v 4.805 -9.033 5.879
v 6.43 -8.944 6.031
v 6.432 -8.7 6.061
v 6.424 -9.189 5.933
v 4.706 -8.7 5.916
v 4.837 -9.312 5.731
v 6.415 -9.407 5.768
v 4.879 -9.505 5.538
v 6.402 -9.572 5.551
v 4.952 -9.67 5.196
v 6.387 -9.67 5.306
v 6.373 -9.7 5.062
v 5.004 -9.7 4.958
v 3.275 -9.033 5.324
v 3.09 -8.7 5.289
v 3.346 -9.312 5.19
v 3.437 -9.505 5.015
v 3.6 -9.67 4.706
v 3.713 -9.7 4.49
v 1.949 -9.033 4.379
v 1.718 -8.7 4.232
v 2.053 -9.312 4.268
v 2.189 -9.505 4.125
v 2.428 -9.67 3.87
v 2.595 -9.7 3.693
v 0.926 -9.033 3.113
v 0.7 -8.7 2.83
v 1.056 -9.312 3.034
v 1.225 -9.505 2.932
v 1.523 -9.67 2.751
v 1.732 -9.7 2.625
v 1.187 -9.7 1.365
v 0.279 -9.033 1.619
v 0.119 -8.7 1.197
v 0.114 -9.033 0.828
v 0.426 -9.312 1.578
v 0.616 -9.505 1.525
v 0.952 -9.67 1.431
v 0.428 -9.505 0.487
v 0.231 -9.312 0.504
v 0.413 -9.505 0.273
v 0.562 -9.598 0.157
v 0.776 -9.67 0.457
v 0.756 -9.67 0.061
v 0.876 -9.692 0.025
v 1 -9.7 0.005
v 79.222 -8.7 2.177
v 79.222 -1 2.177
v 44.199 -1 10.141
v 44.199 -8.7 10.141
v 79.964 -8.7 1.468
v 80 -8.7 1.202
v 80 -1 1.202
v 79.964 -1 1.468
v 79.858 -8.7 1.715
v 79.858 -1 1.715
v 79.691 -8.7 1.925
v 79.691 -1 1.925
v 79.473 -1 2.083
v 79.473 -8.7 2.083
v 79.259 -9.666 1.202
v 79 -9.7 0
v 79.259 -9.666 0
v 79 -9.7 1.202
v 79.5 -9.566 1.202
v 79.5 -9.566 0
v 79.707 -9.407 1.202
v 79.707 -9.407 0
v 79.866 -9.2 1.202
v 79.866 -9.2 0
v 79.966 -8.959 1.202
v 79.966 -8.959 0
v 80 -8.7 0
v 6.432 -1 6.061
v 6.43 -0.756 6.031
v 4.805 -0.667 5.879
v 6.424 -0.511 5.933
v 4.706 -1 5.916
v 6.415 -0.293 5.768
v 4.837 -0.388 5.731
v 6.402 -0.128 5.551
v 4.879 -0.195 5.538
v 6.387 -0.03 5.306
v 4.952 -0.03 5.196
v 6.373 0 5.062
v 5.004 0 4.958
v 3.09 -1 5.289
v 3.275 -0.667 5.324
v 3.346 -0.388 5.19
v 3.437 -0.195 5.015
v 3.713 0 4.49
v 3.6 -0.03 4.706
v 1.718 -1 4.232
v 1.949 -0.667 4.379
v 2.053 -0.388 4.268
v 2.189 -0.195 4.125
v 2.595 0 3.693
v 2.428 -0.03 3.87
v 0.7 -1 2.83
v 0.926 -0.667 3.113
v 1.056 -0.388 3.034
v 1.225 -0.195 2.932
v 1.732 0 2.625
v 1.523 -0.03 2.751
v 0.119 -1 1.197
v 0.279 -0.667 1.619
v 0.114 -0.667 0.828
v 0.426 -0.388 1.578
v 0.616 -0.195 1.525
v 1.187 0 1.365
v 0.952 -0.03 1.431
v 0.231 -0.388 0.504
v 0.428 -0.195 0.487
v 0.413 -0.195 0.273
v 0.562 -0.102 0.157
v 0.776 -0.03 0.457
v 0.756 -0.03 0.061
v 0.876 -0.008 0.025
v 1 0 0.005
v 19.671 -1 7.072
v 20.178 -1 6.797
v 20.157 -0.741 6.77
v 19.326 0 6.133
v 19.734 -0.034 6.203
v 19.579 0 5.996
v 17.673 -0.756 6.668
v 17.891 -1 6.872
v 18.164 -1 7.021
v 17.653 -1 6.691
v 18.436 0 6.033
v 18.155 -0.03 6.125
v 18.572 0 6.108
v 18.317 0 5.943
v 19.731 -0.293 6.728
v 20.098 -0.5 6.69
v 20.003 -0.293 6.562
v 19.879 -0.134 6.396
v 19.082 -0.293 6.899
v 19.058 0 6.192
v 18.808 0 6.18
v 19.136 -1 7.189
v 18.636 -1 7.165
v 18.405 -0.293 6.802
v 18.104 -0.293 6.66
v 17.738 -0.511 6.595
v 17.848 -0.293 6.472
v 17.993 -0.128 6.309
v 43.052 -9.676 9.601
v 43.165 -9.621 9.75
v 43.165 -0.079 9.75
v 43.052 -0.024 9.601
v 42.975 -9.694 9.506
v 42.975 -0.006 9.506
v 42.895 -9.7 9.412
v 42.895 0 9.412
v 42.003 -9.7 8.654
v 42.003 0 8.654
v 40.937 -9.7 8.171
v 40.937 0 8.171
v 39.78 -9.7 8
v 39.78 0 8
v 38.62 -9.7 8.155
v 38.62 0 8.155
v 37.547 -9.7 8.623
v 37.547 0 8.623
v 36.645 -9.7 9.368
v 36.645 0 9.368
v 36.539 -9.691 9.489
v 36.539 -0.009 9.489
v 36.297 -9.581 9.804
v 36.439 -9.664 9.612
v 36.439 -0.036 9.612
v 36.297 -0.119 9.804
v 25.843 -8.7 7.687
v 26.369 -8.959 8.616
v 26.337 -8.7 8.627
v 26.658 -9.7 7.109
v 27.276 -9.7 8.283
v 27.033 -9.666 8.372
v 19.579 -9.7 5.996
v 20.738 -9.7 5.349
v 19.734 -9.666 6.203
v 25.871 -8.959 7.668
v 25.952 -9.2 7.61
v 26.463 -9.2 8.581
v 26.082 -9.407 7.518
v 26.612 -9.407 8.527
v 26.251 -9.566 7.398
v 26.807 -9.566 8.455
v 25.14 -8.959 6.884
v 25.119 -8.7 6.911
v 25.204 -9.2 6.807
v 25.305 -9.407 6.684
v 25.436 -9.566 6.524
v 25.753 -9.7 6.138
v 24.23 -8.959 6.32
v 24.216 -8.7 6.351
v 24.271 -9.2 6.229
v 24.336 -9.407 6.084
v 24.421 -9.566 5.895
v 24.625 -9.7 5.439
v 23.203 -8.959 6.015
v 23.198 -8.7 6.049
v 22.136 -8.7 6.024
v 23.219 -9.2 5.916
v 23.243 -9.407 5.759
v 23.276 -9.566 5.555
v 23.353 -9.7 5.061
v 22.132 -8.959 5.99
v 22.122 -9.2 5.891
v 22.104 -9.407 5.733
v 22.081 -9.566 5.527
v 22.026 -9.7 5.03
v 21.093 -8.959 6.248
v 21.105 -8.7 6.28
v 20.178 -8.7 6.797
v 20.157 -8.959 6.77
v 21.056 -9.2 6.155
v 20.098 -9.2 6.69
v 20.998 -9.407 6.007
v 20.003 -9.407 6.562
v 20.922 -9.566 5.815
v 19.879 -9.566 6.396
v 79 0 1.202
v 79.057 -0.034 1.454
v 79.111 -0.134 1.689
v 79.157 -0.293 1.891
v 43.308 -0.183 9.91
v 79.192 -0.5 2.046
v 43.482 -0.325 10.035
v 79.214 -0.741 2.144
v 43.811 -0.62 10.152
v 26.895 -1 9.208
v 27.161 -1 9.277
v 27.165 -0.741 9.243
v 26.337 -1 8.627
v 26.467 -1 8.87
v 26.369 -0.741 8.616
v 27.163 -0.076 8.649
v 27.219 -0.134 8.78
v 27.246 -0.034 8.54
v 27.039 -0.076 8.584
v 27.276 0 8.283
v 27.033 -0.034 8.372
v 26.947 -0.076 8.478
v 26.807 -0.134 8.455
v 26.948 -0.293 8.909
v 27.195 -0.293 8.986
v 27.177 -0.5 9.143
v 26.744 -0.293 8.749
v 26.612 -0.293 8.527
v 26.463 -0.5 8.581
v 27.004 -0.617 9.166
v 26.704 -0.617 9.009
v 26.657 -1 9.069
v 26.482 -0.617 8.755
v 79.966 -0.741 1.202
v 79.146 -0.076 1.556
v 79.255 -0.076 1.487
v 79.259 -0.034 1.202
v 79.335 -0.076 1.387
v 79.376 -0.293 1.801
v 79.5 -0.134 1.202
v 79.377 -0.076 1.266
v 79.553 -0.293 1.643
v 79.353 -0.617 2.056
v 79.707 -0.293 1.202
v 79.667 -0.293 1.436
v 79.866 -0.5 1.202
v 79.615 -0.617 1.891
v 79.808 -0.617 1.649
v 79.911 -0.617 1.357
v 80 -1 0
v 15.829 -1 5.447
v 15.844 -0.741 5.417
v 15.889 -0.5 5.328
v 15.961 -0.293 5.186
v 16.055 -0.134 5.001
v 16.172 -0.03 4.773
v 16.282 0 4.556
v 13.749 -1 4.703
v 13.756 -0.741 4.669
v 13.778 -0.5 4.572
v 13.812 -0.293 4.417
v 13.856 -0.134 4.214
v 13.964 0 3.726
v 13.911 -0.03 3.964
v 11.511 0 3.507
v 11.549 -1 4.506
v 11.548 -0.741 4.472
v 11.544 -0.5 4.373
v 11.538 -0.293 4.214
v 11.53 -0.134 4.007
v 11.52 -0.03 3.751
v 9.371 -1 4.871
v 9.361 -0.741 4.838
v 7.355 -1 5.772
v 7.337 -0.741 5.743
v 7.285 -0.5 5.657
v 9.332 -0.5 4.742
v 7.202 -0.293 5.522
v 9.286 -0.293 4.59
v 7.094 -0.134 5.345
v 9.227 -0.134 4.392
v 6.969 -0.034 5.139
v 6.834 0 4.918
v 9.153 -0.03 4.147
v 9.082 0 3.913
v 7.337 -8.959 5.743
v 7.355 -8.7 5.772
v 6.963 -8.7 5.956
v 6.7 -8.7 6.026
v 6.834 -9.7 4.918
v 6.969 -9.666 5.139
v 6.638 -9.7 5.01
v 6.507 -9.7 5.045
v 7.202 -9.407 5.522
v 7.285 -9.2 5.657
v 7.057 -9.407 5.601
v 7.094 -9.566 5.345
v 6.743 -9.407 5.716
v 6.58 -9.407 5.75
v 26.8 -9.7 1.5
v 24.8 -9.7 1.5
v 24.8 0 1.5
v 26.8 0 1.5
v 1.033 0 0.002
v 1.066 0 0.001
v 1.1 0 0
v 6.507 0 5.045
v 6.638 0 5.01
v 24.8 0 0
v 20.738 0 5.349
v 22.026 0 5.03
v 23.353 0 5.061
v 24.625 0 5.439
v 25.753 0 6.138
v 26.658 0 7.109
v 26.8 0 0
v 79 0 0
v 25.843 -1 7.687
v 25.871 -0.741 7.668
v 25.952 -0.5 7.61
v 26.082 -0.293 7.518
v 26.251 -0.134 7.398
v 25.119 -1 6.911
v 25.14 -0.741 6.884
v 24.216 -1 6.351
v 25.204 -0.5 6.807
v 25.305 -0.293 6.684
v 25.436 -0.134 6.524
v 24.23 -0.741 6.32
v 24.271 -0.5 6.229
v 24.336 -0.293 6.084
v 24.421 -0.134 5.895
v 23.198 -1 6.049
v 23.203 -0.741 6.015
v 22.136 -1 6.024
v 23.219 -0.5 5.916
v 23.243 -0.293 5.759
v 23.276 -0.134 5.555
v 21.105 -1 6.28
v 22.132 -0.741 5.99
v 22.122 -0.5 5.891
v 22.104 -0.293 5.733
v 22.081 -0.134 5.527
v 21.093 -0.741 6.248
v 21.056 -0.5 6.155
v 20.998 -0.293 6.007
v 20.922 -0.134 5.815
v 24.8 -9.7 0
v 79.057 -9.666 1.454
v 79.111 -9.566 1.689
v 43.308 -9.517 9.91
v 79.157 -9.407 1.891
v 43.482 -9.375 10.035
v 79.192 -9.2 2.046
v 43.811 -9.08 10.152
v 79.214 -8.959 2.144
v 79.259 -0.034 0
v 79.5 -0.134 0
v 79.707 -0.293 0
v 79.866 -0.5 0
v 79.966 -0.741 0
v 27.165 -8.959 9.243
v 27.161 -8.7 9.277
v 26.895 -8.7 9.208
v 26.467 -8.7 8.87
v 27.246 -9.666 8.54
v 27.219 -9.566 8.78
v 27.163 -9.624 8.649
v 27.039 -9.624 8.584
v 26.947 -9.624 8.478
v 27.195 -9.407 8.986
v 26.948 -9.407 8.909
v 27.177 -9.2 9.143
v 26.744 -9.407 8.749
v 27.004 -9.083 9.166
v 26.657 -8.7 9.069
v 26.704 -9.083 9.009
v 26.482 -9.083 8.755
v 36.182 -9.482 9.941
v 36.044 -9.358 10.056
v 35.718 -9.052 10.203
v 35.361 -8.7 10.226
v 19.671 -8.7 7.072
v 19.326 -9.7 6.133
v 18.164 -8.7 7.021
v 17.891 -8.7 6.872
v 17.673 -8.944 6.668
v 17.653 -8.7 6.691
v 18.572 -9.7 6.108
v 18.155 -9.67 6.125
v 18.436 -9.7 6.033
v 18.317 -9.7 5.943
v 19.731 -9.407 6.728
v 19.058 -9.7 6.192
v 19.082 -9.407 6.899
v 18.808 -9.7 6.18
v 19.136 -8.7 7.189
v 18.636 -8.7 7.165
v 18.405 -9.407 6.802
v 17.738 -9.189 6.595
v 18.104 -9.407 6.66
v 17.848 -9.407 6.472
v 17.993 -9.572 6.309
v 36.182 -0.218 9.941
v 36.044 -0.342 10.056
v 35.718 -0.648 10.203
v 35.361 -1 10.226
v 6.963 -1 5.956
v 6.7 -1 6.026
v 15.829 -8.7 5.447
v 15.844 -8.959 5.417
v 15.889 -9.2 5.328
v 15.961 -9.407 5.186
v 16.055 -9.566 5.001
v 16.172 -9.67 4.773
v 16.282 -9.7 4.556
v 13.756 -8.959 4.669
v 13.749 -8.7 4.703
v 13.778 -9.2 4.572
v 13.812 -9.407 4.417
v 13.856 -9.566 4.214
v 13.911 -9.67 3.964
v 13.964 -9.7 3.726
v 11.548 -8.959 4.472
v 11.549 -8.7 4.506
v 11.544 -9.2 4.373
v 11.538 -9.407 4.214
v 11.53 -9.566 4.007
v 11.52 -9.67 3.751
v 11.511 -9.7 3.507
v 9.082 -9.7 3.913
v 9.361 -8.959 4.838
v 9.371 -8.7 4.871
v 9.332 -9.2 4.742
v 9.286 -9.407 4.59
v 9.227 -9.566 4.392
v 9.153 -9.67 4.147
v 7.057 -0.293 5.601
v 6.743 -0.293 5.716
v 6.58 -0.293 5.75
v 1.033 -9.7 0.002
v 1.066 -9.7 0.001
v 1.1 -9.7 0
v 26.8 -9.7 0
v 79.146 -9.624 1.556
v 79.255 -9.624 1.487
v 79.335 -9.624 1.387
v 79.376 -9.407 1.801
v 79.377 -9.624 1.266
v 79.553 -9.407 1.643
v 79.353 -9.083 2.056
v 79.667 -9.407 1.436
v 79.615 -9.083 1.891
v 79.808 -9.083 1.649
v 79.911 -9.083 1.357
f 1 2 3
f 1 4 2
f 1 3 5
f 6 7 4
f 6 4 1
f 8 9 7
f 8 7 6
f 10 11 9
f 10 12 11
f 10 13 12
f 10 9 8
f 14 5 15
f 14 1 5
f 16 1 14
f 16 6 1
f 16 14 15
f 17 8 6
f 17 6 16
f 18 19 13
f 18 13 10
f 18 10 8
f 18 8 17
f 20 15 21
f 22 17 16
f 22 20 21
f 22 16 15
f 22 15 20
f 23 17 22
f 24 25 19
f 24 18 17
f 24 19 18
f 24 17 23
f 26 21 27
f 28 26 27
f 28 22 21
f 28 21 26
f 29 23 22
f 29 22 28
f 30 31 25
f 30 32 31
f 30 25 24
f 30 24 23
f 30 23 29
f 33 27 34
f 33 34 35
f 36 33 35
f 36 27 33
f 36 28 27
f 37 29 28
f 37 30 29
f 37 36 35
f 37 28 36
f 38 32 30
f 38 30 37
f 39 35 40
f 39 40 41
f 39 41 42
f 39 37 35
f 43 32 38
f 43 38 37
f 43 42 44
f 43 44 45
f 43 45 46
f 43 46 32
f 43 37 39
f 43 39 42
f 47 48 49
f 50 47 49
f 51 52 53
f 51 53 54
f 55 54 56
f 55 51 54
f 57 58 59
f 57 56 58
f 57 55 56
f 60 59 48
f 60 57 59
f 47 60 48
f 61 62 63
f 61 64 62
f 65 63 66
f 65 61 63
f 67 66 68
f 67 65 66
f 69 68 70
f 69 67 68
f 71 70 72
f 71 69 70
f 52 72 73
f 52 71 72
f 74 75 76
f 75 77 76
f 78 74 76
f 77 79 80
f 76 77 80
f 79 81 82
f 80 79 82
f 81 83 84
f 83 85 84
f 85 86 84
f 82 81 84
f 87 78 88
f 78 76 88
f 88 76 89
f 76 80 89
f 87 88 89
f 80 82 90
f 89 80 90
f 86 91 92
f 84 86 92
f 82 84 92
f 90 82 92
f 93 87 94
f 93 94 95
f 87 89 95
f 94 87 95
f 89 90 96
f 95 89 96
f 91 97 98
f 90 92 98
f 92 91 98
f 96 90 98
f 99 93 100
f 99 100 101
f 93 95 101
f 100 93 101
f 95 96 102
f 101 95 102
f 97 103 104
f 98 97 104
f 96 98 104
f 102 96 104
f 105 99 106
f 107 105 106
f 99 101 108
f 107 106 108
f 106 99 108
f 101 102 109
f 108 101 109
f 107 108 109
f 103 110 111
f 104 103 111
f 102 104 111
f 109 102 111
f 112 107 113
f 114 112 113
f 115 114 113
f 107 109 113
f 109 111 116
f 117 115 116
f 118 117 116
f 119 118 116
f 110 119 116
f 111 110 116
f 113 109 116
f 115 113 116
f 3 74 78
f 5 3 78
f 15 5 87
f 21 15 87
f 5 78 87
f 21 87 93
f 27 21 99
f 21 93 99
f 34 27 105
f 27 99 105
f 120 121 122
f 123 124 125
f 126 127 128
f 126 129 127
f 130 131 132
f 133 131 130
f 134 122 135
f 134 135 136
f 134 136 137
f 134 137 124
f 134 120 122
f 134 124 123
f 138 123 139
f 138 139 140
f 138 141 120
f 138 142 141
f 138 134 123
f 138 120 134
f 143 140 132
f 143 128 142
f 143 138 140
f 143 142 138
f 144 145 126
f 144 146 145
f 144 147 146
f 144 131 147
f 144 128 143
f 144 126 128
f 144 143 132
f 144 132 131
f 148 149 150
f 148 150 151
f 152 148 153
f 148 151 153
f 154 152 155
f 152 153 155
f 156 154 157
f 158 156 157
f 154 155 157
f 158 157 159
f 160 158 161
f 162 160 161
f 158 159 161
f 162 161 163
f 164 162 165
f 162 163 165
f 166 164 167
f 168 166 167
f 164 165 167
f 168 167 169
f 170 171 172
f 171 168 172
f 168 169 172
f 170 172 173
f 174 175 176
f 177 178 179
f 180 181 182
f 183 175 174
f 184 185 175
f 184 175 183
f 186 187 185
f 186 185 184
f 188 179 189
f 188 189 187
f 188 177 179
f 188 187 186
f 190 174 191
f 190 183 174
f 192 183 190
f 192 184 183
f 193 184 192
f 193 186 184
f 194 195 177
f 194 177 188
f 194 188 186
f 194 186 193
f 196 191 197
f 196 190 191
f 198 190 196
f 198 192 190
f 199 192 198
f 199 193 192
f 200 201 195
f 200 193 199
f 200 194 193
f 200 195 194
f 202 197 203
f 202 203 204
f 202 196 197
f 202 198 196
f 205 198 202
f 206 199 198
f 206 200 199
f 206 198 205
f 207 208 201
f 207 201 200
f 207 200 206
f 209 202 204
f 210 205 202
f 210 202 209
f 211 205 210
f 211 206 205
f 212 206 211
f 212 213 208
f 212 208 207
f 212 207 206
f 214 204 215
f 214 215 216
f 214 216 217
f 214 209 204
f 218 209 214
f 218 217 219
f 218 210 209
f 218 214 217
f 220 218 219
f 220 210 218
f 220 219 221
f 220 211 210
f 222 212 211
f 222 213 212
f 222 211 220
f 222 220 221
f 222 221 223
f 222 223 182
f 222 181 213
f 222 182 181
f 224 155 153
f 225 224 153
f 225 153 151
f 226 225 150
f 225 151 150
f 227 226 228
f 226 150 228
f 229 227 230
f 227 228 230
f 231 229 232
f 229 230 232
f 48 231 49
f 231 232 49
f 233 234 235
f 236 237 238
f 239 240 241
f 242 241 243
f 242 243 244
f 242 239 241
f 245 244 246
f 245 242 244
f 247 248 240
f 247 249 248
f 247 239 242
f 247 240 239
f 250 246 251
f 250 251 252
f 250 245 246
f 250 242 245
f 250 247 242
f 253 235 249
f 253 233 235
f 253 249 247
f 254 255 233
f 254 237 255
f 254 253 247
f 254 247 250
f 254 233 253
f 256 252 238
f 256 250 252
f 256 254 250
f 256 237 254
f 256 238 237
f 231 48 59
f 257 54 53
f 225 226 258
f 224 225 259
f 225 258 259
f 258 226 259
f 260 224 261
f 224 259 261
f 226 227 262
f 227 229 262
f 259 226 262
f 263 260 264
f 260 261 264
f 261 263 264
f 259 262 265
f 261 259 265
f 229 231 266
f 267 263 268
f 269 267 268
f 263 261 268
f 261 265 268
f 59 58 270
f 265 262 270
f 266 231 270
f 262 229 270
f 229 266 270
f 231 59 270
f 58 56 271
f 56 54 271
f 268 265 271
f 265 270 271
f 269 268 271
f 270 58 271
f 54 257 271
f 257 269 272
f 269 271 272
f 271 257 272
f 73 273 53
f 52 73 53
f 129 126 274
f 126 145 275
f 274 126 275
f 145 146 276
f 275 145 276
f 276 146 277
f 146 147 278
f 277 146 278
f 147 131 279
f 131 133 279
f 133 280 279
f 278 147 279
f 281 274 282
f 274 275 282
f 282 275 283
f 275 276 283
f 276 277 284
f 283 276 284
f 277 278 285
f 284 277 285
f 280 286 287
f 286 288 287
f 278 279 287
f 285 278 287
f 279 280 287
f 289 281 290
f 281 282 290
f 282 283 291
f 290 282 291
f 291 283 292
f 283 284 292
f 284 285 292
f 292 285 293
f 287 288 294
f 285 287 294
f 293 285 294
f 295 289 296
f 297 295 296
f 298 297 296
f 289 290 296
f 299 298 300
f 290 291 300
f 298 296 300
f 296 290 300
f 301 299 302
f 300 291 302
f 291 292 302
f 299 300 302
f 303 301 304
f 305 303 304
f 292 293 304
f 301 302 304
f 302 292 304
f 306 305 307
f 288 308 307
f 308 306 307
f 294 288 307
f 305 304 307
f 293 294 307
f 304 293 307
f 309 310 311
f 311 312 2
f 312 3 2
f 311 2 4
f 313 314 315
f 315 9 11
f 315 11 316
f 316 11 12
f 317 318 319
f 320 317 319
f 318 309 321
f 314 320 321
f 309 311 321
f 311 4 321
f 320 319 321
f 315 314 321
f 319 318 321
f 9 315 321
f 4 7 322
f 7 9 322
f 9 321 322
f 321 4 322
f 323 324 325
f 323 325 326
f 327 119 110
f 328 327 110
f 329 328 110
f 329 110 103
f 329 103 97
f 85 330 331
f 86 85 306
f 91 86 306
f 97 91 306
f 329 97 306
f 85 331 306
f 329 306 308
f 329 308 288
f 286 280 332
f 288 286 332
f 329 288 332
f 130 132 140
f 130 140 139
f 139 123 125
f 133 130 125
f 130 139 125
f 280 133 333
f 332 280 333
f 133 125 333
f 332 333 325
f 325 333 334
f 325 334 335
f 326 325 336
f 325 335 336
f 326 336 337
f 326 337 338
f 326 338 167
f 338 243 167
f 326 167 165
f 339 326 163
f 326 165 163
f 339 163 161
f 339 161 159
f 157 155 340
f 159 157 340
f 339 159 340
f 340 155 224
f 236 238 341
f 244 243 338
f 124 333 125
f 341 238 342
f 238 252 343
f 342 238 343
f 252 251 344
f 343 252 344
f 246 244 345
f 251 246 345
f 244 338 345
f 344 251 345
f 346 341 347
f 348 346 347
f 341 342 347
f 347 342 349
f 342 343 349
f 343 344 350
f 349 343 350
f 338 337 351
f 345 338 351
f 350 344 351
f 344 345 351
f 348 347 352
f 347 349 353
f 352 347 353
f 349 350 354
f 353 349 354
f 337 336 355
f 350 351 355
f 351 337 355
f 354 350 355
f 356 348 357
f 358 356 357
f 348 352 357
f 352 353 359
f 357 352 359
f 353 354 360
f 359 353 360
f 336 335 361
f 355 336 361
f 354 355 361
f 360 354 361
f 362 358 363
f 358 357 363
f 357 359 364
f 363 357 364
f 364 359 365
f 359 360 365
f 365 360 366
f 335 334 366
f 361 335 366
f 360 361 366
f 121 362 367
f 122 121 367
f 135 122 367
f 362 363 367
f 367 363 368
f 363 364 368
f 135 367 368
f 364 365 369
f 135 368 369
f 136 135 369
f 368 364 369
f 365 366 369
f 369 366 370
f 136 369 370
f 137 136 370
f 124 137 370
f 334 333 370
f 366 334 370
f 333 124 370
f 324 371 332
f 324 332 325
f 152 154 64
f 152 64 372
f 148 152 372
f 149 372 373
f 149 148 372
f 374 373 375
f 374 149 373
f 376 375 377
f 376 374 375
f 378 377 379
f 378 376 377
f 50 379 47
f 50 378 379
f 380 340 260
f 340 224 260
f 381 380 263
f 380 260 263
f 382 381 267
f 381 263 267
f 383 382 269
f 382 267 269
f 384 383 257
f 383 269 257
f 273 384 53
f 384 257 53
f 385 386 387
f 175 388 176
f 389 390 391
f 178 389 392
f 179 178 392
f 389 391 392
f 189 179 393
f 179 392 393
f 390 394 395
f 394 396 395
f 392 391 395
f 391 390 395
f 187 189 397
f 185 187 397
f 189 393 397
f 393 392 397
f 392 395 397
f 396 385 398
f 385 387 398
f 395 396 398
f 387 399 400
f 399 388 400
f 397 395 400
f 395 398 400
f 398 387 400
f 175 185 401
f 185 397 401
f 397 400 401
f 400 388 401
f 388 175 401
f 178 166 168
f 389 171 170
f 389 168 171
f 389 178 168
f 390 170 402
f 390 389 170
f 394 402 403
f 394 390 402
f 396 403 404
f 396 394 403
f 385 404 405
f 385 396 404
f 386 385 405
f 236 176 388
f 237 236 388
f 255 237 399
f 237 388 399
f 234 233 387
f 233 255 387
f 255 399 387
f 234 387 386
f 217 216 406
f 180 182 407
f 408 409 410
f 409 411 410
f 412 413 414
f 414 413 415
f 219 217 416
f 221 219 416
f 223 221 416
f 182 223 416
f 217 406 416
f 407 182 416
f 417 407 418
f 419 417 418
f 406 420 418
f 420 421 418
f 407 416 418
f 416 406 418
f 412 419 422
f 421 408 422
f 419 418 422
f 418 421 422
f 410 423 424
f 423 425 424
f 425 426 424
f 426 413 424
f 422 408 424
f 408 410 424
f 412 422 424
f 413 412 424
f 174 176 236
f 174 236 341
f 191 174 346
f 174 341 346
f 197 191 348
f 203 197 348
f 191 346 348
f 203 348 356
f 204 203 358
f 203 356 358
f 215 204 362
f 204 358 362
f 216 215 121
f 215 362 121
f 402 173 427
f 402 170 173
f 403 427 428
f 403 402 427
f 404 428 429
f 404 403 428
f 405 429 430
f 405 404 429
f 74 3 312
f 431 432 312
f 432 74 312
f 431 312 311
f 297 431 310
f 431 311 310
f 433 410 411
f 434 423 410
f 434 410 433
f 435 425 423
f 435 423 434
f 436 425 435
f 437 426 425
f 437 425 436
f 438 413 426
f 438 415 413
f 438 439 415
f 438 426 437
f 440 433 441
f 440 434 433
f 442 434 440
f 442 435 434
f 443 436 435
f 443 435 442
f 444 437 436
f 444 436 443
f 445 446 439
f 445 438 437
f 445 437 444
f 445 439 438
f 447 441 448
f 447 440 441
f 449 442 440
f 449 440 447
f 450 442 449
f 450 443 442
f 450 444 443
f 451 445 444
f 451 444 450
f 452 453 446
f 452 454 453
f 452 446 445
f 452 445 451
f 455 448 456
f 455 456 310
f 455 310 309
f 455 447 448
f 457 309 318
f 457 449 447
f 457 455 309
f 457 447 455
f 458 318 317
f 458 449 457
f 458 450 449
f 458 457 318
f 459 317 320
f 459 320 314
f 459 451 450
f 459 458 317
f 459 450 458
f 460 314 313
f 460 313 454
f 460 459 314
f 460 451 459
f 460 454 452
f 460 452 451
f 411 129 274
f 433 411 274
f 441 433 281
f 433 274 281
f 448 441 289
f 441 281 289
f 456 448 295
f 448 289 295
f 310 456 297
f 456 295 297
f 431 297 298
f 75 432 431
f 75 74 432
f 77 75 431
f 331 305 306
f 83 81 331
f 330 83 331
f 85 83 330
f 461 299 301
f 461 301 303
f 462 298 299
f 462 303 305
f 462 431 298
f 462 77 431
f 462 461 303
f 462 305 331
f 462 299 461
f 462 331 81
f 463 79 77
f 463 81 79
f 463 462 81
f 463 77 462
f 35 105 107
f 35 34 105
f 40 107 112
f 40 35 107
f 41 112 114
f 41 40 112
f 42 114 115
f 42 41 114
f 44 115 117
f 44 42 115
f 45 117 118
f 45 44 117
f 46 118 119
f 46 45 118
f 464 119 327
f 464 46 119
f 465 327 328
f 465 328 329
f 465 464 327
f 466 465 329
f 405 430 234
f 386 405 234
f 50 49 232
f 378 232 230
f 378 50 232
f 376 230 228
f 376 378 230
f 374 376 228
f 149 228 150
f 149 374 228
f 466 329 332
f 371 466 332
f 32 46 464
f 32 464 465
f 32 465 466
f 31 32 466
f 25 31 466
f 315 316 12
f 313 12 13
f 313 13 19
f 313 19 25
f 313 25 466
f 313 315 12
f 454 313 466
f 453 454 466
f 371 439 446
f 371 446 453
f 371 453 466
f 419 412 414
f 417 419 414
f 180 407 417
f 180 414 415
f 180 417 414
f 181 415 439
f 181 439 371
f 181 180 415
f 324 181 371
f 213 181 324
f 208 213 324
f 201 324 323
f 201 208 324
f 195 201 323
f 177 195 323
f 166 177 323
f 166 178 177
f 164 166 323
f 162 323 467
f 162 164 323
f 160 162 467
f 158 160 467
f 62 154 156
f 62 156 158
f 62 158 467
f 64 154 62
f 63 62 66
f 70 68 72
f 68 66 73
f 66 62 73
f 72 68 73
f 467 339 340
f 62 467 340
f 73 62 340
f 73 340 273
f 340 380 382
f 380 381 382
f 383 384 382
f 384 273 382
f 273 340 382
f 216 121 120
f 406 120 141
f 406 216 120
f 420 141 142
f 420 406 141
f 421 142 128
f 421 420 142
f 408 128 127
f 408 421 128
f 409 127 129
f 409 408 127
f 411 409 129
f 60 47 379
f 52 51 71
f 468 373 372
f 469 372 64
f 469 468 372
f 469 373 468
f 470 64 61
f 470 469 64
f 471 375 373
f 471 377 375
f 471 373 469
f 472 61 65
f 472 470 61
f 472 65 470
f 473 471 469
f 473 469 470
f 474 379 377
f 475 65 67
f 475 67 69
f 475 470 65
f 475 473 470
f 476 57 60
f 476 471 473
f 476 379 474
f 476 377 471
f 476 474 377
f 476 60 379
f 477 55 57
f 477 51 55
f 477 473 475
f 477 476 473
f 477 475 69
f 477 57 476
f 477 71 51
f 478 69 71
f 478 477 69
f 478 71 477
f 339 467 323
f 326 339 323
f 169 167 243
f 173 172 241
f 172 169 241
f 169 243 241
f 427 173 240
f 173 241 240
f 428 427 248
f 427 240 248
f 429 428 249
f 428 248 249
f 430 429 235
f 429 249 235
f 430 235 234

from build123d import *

# Parameters (mm, degrees)
F1_DEPTH = 9.7
F3_R     = 2
F4_R     = 1
F2_W     = 2
F2_H     = 1.5
F5_DEPTH = 9.701


with BuildPart() as f1:
    # F0 (on Front) → F1 (new body)
    with BuildSketch(Plane.XZ):
        with BuildLine():
            ThreePointArc((7, 6), (2.120195, 4.609772), (0, 0))
            Line((0, 0), (80, 0))
            Line((80, 0), (80, 2))
            Line((80, 2), (43.5, 10.3))
            ThreePointArc((43.5, 10.3), (39.75, 8), (36, 10.3))
            Line((36, 10.3), (26.5, 9.2))
            ThreePointArc((26.5, 9.2), (23.105314, 6.035142), (19, 8.2))
            ThreePointArc((19, 8.2), (13.450531, 4.642557), (7, 6))
        make_face()
    extrude(amount=F1_DEPTH)

    # F3
    f3_edges = [f1.edges().sort_by_distance(p)[0] for p in [
        (19, -4.85, 8.2),
        (7, -4.85, 6),
    ]]
    fillet(f3_edges, radius=F3_R)

    # F4
    f4_edges = [f1.edges().sort_by_distance(p)[0] for p in [
        (26.5, -4.85, 9.2),
        (36, -4.85, 10.3),
        (43.5, -4.85, 10.3),
        (80, -4.85, 2),
        (61.75, 0, 6.15),
        (61.75, -9.7, 6.15),
        (31.25, 0, 9.75),
        (31.25, -9.7, 9.75),
        (1.907739, 0, 4.418816),
        (6.432073, -4.85, 6.060708),
        (0, -4.85, 0),
        (1.907739, -9.7, 4.418816),
        (80, -9.7, 1),
        (80, 0, 1),
    ]]
    fillet(f4_edges, radius=F4_R)

    # F2 (on face) → F5 (cut, through all)
    with BuildSketch(Plane.XZ.offset(9.7)):
        with Locations((25.8, 0.75)):
            Rectangle(F2_W, F2_H)
    extrude(amount=-F5_DEPTH, mode=Mode.SUBTRACT)


solid = f1.part
